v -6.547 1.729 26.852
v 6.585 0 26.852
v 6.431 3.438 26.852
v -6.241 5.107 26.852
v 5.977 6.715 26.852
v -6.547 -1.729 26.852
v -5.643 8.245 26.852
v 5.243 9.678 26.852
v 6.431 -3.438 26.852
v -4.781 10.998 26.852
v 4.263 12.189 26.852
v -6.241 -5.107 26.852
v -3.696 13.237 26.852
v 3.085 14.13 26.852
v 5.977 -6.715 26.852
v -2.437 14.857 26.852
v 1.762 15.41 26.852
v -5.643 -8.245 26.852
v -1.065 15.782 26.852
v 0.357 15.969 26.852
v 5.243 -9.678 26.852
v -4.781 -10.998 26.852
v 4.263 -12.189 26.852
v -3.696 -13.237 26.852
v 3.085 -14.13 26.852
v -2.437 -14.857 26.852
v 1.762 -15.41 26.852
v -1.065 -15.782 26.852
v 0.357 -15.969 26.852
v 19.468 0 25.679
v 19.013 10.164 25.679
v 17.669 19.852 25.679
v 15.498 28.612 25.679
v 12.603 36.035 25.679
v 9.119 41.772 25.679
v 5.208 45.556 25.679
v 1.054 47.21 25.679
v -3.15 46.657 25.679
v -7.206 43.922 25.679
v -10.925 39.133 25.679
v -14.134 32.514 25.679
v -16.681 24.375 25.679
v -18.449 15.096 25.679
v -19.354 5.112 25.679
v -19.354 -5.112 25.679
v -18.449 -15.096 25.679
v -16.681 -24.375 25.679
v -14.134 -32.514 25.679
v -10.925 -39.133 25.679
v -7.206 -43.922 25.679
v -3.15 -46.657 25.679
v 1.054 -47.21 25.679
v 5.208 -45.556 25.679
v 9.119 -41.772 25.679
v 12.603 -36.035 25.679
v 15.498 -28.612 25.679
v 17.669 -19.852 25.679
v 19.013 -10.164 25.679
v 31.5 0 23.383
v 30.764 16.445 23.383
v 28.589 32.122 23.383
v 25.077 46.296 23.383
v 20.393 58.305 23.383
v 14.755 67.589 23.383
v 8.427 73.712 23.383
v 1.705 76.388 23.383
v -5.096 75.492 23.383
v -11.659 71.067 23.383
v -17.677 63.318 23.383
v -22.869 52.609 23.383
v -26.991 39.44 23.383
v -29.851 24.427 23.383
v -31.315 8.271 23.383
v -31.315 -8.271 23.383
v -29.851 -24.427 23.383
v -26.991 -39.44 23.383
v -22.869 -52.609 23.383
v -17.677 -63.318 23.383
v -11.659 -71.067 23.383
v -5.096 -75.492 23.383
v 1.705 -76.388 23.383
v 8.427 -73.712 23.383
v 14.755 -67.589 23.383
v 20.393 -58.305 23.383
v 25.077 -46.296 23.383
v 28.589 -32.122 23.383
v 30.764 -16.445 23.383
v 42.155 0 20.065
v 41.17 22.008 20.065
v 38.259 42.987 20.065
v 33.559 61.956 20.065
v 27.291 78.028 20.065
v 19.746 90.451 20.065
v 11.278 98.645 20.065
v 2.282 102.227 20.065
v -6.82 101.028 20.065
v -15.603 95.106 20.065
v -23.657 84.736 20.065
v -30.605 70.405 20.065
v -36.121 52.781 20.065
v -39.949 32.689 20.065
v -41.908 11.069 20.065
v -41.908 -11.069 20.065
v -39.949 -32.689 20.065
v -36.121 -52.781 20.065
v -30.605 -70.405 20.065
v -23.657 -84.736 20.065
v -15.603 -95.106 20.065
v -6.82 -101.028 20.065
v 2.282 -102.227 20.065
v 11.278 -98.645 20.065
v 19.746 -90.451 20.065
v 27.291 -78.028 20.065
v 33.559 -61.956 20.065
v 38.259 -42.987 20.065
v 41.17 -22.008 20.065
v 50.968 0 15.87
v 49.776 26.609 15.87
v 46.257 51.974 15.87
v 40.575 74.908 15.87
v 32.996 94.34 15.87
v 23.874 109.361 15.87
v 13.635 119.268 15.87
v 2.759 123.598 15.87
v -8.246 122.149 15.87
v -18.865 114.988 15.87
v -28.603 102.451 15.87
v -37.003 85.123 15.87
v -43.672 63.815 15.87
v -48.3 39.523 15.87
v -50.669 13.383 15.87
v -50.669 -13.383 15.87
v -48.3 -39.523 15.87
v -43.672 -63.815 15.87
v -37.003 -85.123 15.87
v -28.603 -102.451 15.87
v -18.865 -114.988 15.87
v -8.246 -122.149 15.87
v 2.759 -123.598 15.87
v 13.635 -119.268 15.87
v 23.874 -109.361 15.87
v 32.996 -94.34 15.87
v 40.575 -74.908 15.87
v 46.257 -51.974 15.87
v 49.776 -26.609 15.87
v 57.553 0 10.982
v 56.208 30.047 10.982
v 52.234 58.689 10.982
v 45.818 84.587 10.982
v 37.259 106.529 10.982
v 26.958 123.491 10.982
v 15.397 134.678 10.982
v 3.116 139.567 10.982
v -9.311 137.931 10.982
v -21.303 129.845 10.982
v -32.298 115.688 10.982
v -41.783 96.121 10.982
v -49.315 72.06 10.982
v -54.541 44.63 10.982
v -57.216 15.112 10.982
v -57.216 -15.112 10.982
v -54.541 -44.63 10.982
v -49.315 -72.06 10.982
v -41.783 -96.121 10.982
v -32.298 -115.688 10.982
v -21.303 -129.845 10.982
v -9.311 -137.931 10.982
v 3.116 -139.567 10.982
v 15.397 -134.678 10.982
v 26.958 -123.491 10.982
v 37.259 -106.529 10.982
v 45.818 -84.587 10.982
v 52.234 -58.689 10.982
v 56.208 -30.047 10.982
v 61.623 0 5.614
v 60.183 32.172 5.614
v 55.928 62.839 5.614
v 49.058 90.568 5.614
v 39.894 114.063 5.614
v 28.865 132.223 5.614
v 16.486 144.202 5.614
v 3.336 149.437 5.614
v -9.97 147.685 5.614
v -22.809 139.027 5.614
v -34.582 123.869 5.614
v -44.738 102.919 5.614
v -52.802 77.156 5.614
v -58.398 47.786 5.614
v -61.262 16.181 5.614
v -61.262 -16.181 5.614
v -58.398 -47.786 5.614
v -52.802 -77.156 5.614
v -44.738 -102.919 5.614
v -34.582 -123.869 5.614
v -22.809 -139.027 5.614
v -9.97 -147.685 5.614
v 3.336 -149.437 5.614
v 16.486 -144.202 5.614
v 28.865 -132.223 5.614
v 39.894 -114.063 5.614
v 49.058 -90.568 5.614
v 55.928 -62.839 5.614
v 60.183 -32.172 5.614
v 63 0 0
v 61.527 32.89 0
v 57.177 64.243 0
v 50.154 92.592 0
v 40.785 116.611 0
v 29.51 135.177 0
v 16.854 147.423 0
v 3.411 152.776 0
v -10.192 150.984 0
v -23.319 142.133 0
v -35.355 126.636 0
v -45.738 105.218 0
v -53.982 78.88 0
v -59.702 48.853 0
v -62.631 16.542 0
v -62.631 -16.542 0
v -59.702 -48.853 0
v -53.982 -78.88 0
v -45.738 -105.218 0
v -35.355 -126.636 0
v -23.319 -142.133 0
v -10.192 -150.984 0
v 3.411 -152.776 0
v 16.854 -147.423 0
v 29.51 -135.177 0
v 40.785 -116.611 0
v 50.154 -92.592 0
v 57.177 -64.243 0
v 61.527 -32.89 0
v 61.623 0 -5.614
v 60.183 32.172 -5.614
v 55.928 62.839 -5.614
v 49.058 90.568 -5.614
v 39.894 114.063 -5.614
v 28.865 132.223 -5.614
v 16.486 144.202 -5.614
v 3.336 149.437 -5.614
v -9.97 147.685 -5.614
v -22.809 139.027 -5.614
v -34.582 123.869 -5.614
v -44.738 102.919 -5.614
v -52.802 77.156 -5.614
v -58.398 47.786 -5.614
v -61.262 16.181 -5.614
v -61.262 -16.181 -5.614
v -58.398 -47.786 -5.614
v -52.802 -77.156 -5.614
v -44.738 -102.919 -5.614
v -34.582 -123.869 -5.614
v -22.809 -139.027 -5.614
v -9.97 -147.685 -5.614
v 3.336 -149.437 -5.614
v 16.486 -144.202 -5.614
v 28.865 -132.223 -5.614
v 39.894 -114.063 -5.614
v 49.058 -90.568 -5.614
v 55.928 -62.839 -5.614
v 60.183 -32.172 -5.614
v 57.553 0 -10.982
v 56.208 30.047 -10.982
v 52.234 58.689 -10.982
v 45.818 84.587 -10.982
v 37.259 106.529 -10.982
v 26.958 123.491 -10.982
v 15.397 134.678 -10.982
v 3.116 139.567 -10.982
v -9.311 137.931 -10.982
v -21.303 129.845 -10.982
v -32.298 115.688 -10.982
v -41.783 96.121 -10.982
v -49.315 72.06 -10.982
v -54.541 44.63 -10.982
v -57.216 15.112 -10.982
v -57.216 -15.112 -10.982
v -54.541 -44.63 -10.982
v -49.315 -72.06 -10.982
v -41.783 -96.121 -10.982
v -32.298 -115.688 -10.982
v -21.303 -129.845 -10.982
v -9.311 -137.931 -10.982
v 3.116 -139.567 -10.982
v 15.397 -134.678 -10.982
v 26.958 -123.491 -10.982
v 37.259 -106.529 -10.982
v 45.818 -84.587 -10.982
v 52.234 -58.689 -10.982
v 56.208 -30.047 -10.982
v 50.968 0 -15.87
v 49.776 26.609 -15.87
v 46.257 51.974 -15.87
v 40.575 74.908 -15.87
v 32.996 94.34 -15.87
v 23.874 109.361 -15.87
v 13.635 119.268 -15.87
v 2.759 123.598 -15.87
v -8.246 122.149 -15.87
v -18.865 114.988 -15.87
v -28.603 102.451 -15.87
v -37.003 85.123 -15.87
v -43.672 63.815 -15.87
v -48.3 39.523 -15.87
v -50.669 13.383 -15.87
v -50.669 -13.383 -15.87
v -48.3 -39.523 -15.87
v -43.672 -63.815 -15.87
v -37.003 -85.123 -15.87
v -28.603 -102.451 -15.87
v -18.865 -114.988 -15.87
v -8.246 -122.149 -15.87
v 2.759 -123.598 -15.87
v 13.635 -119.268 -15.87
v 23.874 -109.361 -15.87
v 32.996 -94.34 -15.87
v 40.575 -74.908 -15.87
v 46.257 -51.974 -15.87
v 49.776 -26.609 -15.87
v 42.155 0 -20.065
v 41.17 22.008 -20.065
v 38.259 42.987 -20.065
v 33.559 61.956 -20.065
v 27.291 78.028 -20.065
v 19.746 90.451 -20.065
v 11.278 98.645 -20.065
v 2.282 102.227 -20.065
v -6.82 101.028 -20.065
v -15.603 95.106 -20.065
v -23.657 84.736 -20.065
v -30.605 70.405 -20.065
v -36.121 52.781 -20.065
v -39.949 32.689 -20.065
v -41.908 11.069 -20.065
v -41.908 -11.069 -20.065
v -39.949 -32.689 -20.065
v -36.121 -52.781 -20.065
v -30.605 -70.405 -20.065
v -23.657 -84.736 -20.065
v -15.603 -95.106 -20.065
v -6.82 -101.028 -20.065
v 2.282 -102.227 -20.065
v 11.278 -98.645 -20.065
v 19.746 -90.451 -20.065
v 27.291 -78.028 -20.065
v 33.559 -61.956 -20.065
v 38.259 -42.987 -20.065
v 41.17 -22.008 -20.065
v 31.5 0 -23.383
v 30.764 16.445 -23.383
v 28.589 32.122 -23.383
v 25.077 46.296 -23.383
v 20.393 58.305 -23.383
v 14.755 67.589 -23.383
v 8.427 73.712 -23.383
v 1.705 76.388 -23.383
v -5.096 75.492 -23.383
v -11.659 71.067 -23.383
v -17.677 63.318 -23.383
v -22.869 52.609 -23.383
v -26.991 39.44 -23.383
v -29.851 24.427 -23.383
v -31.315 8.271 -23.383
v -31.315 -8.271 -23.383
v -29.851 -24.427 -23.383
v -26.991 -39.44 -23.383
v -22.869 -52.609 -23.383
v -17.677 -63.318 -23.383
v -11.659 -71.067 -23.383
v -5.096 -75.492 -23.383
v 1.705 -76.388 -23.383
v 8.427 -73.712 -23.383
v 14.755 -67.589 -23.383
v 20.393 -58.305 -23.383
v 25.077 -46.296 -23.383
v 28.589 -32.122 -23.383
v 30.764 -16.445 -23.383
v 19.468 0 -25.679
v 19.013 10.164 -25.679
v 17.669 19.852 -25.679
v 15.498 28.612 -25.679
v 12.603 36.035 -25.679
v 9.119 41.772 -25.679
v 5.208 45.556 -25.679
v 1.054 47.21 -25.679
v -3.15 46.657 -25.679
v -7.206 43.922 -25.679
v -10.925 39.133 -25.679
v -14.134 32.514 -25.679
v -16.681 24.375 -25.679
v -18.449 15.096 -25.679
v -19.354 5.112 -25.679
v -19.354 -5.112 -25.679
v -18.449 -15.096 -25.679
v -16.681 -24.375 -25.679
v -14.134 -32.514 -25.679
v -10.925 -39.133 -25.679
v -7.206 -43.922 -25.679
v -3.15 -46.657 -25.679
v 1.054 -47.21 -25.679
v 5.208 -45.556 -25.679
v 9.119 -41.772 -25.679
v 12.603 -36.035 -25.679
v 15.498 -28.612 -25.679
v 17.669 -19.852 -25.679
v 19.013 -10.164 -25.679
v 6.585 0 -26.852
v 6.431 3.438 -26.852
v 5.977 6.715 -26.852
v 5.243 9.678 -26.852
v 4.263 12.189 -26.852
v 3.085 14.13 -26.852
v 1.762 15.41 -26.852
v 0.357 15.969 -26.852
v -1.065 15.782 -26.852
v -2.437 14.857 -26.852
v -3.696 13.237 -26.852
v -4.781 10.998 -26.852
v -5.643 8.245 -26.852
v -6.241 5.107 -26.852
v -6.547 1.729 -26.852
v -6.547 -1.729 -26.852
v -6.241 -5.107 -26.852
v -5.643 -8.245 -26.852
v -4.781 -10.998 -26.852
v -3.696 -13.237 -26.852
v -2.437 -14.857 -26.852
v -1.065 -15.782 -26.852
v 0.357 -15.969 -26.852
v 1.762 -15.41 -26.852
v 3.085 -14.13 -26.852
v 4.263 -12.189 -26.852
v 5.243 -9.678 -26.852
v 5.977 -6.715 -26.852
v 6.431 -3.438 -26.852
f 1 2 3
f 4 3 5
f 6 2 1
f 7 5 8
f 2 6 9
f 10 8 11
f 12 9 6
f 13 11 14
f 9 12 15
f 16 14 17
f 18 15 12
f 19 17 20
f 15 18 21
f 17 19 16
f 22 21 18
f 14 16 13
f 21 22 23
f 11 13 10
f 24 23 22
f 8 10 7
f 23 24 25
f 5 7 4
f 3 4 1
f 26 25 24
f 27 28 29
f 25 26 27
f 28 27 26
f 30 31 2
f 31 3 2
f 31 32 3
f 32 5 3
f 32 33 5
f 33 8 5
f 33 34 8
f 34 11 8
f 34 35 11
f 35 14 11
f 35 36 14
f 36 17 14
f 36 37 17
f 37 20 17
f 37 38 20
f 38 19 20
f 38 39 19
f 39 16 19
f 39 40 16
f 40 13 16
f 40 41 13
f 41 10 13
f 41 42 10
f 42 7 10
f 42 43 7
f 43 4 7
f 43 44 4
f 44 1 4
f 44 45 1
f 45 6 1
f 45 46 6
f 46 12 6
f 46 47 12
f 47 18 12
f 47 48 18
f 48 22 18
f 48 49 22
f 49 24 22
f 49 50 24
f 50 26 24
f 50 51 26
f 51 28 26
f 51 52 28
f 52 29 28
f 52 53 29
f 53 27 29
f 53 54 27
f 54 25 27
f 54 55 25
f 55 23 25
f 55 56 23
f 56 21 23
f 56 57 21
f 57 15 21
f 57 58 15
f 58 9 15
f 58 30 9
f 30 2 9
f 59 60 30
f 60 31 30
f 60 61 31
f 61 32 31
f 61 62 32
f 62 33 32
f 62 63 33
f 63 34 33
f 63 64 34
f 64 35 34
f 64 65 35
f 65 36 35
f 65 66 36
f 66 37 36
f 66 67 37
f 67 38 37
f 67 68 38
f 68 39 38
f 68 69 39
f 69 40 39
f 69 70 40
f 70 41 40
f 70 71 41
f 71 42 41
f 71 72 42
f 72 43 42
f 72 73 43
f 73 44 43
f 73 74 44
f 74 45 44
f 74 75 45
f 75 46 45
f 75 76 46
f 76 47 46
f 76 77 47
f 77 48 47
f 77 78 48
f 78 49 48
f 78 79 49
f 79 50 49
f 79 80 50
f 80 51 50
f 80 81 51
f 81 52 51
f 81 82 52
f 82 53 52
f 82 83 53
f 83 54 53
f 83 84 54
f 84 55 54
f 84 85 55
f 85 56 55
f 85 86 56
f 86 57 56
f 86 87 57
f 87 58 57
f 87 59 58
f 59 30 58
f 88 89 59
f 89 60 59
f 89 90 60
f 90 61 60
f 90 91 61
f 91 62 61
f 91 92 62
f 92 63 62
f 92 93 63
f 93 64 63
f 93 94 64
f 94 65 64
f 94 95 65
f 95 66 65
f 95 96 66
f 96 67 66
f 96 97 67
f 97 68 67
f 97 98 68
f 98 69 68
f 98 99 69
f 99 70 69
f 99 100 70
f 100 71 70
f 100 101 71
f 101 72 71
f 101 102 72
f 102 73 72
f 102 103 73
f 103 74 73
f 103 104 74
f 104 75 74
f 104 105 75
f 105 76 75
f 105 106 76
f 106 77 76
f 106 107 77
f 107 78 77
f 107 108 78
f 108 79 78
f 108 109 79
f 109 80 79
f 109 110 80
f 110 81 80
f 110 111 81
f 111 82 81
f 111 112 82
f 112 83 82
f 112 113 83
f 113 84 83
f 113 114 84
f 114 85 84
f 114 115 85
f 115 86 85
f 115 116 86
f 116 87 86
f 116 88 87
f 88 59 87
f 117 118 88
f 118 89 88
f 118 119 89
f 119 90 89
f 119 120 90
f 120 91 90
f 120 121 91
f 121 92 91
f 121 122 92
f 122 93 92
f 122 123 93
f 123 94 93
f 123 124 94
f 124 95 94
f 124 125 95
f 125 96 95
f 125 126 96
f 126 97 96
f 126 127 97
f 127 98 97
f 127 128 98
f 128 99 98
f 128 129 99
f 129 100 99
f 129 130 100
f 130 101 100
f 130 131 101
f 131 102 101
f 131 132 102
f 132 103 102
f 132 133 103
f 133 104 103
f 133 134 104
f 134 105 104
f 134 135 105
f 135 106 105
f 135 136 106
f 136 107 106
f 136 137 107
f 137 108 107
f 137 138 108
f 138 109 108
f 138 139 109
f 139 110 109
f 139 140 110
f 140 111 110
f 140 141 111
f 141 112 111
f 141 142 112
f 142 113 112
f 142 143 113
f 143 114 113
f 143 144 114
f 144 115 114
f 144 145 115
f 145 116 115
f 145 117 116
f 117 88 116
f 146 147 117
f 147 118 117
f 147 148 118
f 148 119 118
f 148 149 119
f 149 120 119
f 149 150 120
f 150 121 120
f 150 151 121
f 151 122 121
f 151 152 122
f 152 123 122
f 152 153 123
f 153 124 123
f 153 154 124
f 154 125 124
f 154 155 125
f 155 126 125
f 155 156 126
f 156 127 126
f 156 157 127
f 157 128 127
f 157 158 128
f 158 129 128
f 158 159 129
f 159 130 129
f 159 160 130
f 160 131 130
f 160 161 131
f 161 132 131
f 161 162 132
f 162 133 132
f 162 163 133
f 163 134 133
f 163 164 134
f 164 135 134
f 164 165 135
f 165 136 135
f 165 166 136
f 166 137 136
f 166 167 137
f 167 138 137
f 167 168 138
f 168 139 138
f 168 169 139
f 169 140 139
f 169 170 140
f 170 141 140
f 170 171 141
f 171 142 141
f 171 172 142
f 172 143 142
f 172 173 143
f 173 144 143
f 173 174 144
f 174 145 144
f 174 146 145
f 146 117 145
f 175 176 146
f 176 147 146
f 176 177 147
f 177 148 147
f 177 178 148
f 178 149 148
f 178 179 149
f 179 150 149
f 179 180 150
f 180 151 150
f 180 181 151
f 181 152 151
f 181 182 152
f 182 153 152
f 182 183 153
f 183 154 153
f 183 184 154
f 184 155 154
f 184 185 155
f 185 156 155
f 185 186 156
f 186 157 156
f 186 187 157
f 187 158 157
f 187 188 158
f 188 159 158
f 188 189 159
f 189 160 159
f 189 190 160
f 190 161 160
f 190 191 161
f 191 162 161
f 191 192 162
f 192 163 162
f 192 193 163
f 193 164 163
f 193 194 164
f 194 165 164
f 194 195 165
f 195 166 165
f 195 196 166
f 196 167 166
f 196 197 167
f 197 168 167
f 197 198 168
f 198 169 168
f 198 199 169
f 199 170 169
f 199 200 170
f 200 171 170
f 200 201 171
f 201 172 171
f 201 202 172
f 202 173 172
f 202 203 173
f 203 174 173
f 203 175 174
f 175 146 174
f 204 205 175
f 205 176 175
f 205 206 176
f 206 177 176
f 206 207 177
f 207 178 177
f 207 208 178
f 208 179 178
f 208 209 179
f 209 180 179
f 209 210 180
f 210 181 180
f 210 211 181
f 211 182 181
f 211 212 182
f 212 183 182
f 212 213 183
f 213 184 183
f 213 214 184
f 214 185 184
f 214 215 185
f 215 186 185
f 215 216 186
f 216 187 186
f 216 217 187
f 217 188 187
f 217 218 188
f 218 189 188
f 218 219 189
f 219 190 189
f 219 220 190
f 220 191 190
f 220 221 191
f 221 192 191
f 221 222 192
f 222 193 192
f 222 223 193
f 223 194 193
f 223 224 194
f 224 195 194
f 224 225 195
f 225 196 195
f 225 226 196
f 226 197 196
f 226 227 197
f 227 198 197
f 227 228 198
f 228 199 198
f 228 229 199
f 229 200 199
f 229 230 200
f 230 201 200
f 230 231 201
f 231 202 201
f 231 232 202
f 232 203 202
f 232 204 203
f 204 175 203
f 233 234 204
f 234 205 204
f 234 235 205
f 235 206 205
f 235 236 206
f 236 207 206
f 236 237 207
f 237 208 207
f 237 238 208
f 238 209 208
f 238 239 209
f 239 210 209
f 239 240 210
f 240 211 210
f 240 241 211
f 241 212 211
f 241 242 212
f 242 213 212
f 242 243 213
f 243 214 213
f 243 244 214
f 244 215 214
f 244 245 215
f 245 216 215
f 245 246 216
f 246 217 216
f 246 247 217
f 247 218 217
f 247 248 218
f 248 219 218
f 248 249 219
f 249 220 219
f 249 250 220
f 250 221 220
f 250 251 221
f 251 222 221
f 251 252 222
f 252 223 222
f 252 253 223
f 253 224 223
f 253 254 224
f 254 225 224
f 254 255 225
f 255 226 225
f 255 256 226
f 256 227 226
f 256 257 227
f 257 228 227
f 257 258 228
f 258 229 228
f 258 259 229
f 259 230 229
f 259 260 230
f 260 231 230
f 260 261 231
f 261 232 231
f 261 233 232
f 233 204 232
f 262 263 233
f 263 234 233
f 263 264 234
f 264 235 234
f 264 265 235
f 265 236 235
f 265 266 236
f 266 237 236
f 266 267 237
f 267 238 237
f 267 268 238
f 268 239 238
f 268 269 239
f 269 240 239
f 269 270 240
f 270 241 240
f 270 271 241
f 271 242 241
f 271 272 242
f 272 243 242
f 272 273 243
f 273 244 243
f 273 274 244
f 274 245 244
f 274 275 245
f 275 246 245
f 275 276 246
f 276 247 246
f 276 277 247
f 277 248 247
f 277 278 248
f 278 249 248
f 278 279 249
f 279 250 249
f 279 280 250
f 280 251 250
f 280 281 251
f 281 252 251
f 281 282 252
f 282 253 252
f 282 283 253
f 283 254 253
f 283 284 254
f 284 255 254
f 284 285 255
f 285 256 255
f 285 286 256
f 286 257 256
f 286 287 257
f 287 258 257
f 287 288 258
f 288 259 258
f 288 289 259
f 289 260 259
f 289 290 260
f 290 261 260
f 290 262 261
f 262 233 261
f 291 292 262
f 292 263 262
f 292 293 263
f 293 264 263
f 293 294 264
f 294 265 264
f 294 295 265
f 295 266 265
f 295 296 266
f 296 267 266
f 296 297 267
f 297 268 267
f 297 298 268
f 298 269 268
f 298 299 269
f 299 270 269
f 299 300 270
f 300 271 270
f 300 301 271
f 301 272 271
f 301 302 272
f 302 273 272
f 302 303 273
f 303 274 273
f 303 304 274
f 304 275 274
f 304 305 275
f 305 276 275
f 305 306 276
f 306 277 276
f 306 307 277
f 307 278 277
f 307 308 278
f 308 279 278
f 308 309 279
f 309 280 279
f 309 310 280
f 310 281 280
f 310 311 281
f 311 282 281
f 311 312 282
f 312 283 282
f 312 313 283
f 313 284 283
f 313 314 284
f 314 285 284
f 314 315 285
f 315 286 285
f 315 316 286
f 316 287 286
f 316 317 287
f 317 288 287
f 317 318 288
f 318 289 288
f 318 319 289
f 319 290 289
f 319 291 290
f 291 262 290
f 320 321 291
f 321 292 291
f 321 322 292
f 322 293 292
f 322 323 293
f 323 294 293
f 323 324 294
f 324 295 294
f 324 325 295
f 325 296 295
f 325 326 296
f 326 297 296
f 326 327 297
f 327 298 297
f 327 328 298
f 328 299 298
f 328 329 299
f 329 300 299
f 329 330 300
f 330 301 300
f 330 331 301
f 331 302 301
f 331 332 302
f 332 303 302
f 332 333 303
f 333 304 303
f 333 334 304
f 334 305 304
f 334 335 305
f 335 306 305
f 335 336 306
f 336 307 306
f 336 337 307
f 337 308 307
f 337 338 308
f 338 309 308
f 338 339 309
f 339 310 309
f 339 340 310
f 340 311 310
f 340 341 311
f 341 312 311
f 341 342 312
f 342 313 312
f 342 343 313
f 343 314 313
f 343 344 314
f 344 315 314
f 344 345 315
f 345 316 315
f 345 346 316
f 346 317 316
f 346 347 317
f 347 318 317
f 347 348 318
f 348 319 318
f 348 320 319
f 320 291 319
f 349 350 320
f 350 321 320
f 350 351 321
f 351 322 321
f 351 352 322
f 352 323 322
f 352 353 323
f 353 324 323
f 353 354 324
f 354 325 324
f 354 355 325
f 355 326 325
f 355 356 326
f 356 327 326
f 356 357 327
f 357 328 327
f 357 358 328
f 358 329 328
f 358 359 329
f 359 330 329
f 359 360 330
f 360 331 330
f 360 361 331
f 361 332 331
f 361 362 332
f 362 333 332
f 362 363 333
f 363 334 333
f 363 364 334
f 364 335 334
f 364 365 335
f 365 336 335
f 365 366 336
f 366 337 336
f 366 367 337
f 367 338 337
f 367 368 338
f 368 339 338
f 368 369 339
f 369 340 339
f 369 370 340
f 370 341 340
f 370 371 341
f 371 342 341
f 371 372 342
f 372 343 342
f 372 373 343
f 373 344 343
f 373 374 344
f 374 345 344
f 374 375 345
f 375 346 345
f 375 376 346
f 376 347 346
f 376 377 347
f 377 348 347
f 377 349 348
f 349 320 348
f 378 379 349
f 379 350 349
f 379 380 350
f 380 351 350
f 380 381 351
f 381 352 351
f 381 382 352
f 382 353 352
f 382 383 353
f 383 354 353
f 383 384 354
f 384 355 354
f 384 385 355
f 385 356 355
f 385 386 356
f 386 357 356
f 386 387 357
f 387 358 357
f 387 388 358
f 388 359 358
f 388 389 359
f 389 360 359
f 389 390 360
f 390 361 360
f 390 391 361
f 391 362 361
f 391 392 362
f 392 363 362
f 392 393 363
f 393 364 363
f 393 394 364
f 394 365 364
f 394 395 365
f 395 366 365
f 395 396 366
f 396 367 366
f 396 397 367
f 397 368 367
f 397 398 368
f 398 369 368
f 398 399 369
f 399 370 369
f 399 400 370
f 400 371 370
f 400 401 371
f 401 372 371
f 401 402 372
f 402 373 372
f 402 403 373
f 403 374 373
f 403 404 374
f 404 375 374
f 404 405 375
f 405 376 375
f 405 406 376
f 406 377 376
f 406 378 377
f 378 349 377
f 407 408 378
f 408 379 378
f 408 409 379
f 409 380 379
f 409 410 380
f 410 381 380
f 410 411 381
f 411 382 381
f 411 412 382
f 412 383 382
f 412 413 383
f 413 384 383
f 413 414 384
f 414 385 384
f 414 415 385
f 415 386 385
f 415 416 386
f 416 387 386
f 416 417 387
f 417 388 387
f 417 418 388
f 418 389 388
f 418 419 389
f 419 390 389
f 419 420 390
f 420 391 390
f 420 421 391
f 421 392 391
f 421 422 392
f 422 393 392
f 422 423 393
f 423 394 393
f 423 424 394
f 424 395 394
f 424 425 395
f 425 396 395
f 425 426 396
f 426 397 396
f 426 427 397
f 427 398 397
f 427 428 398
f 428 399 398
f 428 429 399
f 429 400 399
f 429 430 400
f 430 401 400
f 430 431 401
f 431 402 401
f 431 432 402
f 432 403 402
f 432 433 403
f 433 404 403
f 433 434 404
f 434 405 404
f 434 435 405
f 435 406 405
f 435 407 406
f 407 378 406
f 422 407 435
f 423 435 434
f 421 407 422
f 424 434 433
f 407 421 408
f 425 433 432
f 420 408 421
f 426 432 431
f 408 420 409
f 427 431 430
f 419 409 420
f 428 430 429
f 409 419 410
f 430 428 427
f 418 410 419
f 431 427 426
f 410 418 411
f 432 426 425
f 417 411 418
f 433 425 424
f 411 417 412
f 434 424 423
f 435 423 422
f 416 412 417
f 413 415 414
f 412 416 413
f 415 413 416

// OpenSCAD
// Generated by SolidPython 1.0.1 on 2020-07-29 00:46:48


scale(v = [7, 17, 3]) {
	sphere(r = 9);
}
/***********************************************
*********      SolidPython code:      **********
************************************************
 
# import packages: SolidPython
from solid import *
from solid.utils import *
from itertools import chain, combinations, permutations


class Resize:

    def __init__(self, scad_file):
        self.scad_file = scad_file
        #self.scad_file = import_scad(scad_file)
        # cone/cylinder param:
        self.r1 = 0
        self.r2 = 0
        self.h = 0
        # rectangular prism param:
        self.w = 0
        self.l = 0
        # ellipse param:
        self.r = 0

    # import OpenScad code (file name corresponds to shape)


    # classify shape + parameters
    def assign(self, param1, param2, param3):
        if self.scad_file == 'cone.scad':
            self.r1 = param1
            self.r2 = param2
            self.h = param3
        elif self.scad_file == 'cylinder.scad':
            self.r1 = param1
            self.r2 = param2
            self.h = param3
        elif self.scad_file == 'rectangularPrism.scad':
            self.h = param1
            self.l = param2
            self.w = param3
        else:
            self.r = param1
            self.h = param2

    # resize parameters
    def iterate(self):
        x = range(3, 20, 2)
        i = 1
        if self.scad_file == 'cone.scad':
            tempList = list(permutations(x, 2))
            for temp in tempList:
                param1 = temp[0]
                param2 = temp[1]
                filepath = 'produced_scad_files/' + 'cone' + str(param1) + '_' + str(param2) + '_' + '.scad'
                scad_render_to_file(cylinder(h=param1, r1=param2, r2=0), filepath)

        elif self.scad_file == 'cylinder.scad':
            tempList = list(permutations(x, 3))
            for temp in tempList:
                param1 = temp[0]
                param2 = temp[1]
                filepath = 'produced_scad_files/' + 'cylinder' + str(param1) + '_' + str(param2) + '_' + '.scad'
                scad_render_to_file(cylinder(h=param1, r1=param2, r2=param2), filepath)

        elif self.scad_file == 'rectangularPrism.scad':
            tempList = list(permutations(x, 3))
            for temp in tempList:
                param1 = temp[0]
                param2 = temp[1]
                param3 = temp[2]
                filepath = 'produced_scad_files/' + 'rectangularPrism' + str(param1) + '_' + str(param2) + '_' + str(
                    param3) + '.scad'
                scad_render_to_file(cube(size=(param1, param2, param3)), filepath)

        elif self.scad_file == 'ellipse.scad':
            tempList = list(permutations(x, 4))
            for temp in tempList:
                param1 = temp[0]
                param2 = temp[1]
                param3 = temp[2]
                param4 = temp[3]
                filepath = 'produced_scad_files/' + 'ellipse' + str(param1) + '_' + str(param2) + '_' + str(param3) + '_' + str(param4) + '.scad'
                scad_render_to_file(scale([param1, param2, param3])(sphere(r=param4)), filepath)

    def render_to_scadfile(self):
        scad_render_to_file(scad, 'example.scad') 
 
************************************************/
